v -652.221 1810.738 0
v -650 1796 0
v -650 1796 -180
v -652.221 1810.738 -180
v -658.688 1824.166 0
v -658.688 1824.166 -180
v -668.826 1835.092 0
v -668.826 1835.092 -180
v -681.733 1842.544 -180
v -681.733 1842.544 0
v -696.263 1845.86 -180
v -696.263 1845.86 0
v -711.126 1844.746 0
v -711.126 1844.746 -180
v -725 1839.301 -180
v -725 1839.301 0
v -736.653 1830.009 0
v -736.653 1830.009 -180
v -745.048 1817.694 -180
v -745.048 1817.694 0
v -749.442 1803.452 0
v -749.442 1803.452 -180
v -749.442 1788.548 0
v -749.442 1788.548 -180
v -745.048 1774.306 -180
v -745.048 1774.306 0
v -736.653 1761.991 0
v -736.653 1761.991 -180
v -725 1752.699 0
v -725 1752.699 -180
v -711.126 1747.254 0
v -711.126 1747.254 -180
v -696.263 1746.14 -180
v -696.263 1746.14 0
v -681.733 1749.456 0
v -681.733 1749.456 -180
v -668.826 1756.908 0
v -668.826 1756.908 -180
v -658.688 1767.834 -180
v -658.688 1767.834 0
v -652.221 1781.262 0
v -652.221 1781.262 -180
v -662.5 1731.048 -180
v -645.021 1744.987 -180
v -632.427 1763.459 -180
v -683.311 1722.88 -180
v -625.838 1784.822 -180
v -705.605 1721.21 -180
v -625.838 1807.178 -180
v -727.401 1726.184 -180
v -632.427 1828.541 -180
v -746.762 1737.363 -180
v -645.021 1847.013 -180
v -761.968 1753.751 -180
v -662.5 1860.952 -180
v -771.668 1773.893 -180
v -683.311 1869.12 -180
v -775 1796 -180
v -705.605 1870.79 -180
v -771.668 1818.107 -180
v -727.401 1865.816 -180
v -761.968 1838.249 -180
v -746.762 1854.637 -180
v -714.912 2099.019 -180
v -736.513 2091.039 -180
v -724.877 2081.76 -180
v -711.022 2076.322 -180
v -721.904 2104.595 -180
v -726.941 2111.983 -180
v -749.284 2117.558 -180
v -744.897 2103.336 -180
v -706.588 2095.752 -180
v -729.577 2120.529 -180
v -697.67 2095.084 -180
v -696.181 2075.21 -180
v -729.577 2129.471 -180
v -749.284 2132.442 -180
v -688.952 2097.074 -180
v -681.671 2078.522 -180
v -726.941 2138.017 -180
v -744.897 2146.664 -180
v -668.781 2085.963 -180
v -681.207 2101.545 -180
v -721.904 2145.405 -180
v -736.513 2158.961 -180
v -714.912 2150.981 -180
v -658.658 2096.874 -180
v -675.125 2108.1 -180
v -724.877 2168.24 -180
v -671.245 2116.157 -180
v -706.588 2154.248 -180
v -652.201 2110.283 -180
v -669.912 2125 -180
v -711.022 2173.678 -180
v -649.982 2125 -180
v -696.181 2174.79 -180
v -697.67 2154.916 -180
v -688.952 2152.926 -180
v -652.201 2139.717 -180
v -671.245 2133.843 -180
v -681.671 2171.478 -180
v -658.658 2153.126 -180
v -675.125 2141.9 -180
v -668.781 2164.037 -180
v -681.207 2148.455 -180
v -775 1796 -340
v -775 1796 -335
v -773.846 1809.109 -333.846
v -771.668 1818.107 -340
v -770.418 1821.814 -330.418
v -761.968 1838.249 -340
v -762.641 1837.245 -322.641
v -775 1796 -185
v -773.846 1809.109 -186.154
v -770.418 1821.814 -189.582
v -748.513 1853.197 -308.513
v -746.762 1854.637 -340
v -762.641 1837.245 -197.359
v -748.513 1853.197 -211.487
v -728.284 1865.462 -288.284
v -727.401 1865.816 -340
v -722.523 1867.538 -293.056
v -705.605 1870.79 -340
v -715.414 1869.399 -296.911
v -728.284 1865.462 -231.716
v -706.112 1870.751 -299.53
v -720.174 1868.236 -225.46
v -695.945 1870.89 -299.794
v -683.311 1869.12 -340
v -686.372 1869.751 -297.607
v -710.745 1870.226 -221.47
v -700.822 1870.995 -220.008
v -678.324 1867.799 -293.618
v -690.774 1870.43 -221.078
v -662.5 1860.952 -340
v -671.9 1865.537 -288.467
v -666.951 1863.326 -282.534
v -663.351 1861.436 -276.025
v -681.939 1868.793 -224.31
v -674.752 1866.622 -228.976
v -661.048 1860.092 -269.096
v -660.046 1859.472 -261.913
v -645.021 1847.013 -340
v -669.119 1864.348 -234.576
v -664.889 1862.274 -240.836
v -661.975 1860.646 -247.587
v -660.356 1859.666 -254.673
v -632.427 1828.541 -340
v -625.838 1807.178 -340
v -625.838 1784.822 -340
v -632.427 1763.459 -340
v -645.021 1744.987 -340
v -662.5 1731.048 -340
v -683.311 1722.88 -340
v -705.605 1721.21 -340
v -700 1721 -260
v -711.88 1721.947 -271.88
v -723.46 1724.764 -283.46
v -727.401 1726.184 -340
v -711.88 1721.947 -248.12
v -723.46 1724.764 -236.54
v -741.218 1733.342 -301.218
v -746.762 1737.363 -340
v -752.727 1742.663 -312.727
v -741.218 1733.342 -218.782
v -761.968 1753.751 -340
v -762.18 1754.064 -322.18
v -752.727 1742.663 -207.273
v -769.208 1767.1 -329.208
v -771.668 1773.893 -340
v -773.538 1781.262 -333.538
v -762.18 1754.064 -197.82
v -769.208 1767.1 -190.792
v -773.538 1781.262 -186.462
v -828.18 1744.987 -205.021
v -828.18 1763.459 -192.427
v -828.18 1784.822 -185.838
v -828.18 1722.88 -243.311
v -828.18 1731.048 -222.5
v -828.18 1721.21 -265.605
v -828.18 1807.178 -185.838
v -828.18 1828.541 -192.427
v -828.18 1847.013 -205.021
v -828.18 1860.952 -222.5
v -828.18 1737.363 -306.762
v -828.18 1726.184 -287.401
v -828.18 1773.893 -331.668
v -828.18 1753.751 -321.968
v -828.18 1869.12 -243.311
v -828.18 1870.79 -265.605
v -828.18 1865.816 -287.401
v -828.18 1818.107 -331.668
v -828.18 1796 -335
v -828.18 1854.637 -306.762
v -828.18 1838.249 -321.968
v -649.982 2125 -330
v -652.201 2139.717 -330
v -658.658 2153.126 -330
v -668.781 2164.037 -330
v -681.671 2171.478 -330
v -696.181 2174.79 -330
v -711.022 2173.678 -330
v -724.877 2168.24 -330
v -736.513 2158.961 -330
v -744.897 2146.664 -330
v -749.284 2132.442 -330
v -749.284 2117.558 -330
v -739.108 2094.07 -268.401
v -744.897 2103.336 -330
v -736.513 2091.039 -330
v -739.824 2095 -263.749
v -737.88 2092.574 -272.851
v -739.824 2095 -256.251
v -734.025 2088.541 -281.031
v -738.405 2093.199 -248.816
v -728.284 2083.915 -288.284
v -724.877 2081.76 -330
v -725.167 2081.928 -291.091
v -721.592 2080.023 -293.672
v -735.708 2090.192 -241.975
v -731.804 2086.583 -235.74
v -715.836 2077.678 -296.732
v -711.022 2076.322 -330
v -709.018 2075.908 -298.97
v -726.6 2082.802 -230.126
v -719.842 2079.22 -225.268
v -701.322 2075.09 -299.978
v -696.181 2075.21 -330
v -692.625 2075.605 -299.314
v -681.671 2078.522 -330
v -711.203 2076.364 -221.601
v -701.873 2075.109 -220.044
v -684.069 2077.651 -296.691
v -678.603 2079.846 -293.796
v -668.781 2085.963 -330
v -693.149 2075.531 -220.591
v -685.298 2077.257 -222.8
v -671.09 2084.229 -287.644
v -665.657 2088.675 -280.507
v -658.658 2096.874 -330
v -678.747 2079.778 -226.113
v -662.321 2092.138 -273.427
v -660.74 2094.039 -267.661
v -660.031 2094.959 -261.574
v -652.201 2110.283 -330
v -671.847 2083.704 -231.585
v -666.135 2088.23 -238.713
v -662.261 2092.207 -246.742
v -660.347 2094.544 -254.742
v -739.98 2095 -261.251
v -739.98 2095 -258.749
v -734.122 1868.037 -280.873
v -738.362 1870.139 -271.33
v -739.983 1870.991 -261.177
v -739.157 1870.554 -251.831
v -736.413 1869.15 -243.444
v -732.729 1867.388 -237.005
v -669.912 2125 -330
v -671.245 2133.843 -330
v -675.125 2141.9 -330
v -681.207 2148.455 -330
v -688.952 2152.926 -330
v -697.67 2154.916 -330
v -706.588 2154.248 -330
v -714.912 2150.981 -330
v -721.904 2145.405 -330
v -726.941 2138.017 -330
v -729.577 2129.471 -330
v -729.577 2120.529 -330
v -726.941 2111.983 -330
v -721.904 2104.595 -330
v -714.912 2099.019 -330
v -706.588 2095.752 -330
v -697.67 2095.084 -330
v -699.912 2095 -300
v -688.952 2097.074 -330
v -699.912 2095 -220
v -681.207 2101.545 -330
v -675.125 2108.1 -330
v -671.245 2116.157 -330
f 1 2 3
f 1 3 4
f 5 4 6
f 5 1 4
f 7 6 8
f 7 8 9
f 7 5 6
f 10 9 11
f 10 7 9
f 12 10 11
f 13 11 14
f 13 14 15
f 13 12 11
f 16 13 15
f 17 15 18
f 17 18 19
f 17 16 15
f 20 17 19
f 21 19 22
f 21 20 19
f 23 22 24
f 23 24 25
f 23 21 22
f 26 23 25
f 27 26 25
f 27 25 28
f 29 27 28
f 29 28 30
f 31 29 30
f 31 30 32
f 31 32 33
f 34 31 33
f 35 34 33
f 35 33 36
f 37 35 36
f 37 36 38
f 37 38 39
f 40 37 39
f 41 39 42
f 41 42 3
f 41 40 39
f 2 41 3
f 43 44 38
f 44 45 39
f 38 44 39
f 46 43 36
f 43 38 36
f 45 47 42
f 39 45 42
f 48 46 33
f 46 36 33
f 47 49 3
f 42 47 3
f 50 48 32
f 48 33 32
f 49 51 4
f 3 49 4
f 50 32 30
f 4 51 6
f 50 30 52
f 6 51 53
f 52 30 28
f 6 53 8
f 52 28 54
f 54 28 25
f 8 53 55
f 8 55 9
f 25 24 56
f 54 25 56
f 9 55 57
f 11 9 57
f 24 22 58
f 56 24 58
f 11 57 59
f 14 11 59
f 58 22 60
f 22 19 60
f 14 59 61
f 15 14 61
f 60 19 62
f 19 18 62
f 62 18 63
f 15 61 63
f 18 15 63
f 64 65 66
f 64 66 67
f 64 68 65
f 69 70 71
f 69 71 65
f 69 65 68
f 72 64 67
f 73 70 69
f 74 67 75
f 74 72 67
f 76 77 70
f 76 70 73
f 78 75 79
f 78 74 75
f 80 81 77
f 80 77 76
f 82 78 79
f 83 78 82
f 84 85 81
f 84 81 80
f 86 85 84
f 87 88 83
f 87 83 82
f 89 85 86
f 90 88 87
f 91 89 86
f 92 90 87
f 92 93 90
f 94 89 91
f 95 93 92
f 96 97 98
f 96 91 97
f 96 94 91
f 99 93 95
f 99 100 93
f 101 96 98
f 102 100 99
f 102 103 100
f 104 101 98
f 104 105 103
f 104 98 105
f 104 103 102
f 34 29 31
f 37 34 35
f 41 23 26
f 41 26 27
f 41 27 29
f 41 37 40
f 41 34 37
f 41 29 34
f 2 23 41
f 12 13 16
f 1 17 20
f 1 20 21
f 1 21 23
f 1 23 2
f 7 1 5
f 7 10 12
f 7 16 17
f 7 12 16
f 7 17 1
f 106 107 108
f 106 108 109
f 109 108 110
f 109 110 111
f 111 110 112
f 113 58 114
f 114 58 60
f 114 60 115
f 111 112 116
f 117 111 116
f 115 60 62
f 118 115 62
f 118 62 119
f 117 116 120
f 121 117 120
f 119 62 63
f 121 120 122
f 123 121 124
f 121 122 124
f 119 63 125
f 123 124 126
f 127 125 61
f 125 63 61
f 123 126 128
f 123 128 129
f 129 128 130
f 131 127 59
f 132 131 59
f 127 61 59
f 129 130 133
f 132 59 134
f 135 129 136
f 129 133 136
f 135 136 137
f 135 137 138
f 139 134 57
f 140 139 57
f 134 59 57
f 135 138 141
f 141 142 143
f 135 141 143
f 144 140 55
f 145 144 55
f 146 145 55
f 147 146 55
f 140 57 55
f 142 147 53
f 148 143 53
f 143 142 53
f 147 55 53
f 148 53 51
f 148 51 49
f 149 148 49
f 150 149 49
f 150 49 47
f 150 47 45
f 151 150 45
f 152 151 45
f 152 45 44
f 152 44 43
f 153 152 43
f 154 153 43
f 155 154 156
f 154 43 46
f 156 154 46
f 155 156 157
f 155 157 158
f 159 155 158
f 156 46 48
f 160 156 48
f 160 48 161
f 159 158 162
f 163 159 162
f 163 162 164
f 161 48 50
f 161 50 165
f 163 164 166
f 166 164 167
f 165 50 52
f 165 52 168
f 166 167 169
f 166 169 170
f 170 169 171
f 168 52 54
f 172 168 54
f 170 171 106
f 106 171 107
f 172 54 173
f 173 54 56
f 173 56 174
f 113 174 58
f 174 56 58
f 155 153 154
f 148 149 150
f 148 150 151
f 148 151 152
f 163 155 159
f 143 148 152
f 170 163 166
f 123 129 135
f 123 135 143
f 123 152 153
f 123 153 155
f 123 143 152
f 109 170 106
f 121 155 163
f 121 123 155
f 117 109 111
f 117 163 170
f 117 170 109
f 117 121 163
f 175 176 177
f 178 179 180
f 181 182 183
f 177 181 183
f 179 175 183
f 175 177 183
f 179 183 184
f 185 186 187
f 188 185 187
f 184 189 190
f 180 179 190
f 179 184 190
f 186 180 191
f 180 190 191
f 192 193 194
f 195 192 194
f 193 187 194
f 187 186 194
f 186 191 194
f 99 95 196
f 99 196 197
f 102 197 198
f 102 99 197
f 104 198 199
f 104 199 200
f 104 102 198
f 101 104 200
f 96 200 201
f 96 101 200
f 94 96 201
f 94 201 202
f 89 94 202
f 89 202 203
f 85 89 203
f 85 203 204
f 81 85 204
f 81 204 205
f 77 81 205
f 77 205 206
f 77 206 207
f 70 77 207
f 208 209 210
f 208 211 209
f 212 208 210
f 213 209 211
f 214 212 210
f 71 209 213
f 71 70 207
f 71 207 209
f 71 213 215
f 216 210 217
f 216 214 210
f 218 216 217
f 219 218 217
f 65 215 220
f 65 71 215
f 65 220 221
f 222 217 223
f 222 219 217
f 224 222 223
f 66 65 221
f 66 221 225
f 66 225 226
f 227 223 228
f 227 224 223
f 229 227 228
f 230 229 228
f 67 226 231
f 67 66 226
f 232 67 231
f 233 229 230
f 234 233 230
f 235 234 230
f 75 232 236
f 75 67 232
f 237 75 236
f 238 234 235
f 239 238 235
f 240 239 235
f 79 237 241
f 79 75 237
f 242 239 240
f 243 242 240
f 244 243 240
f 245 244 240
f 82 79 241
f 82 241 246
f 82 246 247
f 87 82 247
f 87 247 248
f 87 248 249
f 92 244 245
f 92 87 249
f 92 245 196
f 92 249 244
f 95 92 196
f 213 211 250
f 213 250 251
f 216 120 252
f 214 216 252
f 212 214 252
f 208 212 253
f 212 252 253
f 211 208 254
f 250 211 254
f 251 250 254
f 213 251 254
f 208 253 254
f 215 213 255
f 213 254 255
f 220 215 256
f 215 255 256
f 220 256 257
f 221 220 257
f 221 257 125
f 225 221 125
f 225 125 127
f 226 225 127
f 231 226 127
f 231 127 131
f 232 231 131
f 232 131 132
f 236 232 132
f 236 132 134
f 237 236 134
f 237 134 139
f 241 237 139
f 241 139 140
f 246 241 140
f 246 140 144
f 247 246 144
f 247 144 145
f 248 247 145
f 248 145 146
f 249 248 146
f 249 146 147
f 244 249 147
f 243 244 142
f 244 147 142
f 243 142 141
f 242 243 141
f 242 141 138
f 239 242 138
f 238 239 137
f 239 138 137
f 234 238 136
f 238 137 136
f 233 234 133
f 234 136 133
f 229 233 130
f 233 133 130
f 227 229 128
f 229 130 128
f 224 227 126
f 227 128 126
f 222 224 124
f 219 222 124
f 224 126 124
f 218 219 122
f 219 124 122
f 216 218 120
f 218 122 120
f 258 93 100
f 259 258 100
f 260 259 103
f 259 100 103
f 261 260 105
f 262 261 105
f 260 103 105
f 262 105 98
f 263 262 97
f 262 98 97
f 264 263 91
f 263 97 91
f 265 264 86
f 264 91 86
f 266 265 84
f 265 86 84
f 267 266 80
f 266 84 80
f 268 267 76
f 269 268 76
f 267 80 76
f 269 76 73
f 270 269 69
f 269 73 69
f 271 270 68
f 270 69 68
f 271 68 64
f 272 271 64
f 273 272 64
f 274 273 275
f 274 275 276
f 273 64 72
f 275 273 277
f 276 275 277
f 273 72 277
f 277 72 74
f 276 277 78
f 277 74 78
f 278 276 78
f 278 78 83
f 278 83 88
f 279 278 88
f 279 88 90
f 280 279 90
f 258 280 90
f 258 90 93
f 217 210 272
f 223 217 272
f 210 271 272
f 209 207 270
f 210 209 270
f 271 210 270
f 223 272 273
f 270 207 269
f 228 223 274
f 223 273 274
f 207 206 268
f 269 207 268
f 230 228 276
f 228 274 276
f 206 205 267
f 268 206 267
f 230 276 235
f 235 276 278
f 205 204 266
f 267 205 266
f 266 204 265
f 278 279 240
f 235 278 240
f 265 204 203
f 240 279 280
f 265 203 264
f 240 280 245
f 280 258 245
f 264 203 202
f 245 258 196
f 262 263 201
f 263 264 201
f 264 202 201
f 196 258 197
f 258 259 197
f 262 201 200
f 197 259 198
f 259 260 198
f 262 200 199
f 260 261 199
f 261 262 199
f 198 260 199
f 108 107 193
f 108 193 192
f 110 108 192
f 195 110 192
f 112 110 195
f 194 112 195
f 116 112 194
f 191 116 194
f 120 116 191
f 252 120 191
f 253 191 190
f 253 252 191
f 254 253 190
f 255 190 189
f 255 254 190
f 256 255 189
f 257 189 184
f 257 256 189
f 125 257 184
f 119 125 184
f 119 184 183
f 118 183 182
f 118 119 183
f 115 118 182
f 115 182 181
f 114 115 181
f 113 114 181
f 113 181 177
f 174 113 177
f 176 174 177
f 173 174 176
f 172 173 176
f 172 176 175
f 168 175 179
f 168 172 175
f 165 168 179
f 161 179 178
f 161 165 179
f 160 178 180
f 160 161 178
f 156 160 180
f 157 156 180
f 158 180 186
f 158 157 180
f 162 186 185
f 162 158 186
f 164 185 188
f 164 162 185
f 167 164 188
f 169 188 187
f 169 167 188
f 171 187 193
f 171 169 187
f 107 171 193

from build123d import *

# Parameters (mm, degrees)
SKETCH1_R           = 50
BOSS_EXTRUDE1_DEPTH = 180
SKETCH2_R           = 75
BOSS_EXTRUDE2_DEPTH = 160
SKETCH3_R           = 75
BOSS_EXTRUDE3_DEPTH = 128.18
SKETCH6_R           = 40
BOSS_EXTRUDE6_DEPTH = 300
SKETCH7_R           = 49.929591809
SKETCH7_R_2         = 30
BOSS_EXTRUDE7_DEPTH = 150


with BuildPart() as part:
    # Sketch1 → Boss-Extrude1 (new body)
    with BuildSketch(Plane.XY):
        with Locations((-700, 1796)):
            Circle(SKETCH1_R)
    extrude(amount=-BOSS_EXTRUDE1_DEPTH)

    # Sketch2 → Boss-Extrude2 (add)
    with BuildSketch(Plane(origin=(0, 0, -180), x_dir=(-1, 0, 0), z_dir=(0, 0, -1))):
        with Locations((700, 1796)):
            Circle(SKETCH2_R)
    extrude(amount=BOSS_EXTRUDE2_DEPTH)

    # Sketch3 → Boss-Extrude3 (add)
    with BuildSketch(Plane(origin=(-700, 0, 0), x_dir=(0, 0, -1), z_dir=(1, 0, 0))):
        with Locations((260, 1796)):
            Circle(SKETCH3_R)
    extrude(amount=-BOSS_EXTRUDE3_DEPTH)

    # Sketch6 → Boss-Extrude6 (add)
    with BuildSketch(Plane(origin=(0, 1795, 0), x_dir=(-1, 0, 0), z_dir=(0, 1, 0))):
        with Locations(Location((700, -260, 0), (0, 0, 314.999999875))):
            Circle(SKETCH6_R)
    extrude(amount=BOSS_EXTRUDE6_DEPTH)

    # Sketch7 → Boss-Extrude7 (add)
    with BuildSketch(Plane.XY.offset(-180)):
        with Locations((-699.911954828, 2125)):
            Circle(SKETCH7_R)
        with Locations((-699.911954828, 2125)):
            Circle(SKETCH7_R_2, mode=Mode.SUBTRACT)
    extrude(amount=-BOSS_EXTRUDE7_DEPTH)


solid = part.part
